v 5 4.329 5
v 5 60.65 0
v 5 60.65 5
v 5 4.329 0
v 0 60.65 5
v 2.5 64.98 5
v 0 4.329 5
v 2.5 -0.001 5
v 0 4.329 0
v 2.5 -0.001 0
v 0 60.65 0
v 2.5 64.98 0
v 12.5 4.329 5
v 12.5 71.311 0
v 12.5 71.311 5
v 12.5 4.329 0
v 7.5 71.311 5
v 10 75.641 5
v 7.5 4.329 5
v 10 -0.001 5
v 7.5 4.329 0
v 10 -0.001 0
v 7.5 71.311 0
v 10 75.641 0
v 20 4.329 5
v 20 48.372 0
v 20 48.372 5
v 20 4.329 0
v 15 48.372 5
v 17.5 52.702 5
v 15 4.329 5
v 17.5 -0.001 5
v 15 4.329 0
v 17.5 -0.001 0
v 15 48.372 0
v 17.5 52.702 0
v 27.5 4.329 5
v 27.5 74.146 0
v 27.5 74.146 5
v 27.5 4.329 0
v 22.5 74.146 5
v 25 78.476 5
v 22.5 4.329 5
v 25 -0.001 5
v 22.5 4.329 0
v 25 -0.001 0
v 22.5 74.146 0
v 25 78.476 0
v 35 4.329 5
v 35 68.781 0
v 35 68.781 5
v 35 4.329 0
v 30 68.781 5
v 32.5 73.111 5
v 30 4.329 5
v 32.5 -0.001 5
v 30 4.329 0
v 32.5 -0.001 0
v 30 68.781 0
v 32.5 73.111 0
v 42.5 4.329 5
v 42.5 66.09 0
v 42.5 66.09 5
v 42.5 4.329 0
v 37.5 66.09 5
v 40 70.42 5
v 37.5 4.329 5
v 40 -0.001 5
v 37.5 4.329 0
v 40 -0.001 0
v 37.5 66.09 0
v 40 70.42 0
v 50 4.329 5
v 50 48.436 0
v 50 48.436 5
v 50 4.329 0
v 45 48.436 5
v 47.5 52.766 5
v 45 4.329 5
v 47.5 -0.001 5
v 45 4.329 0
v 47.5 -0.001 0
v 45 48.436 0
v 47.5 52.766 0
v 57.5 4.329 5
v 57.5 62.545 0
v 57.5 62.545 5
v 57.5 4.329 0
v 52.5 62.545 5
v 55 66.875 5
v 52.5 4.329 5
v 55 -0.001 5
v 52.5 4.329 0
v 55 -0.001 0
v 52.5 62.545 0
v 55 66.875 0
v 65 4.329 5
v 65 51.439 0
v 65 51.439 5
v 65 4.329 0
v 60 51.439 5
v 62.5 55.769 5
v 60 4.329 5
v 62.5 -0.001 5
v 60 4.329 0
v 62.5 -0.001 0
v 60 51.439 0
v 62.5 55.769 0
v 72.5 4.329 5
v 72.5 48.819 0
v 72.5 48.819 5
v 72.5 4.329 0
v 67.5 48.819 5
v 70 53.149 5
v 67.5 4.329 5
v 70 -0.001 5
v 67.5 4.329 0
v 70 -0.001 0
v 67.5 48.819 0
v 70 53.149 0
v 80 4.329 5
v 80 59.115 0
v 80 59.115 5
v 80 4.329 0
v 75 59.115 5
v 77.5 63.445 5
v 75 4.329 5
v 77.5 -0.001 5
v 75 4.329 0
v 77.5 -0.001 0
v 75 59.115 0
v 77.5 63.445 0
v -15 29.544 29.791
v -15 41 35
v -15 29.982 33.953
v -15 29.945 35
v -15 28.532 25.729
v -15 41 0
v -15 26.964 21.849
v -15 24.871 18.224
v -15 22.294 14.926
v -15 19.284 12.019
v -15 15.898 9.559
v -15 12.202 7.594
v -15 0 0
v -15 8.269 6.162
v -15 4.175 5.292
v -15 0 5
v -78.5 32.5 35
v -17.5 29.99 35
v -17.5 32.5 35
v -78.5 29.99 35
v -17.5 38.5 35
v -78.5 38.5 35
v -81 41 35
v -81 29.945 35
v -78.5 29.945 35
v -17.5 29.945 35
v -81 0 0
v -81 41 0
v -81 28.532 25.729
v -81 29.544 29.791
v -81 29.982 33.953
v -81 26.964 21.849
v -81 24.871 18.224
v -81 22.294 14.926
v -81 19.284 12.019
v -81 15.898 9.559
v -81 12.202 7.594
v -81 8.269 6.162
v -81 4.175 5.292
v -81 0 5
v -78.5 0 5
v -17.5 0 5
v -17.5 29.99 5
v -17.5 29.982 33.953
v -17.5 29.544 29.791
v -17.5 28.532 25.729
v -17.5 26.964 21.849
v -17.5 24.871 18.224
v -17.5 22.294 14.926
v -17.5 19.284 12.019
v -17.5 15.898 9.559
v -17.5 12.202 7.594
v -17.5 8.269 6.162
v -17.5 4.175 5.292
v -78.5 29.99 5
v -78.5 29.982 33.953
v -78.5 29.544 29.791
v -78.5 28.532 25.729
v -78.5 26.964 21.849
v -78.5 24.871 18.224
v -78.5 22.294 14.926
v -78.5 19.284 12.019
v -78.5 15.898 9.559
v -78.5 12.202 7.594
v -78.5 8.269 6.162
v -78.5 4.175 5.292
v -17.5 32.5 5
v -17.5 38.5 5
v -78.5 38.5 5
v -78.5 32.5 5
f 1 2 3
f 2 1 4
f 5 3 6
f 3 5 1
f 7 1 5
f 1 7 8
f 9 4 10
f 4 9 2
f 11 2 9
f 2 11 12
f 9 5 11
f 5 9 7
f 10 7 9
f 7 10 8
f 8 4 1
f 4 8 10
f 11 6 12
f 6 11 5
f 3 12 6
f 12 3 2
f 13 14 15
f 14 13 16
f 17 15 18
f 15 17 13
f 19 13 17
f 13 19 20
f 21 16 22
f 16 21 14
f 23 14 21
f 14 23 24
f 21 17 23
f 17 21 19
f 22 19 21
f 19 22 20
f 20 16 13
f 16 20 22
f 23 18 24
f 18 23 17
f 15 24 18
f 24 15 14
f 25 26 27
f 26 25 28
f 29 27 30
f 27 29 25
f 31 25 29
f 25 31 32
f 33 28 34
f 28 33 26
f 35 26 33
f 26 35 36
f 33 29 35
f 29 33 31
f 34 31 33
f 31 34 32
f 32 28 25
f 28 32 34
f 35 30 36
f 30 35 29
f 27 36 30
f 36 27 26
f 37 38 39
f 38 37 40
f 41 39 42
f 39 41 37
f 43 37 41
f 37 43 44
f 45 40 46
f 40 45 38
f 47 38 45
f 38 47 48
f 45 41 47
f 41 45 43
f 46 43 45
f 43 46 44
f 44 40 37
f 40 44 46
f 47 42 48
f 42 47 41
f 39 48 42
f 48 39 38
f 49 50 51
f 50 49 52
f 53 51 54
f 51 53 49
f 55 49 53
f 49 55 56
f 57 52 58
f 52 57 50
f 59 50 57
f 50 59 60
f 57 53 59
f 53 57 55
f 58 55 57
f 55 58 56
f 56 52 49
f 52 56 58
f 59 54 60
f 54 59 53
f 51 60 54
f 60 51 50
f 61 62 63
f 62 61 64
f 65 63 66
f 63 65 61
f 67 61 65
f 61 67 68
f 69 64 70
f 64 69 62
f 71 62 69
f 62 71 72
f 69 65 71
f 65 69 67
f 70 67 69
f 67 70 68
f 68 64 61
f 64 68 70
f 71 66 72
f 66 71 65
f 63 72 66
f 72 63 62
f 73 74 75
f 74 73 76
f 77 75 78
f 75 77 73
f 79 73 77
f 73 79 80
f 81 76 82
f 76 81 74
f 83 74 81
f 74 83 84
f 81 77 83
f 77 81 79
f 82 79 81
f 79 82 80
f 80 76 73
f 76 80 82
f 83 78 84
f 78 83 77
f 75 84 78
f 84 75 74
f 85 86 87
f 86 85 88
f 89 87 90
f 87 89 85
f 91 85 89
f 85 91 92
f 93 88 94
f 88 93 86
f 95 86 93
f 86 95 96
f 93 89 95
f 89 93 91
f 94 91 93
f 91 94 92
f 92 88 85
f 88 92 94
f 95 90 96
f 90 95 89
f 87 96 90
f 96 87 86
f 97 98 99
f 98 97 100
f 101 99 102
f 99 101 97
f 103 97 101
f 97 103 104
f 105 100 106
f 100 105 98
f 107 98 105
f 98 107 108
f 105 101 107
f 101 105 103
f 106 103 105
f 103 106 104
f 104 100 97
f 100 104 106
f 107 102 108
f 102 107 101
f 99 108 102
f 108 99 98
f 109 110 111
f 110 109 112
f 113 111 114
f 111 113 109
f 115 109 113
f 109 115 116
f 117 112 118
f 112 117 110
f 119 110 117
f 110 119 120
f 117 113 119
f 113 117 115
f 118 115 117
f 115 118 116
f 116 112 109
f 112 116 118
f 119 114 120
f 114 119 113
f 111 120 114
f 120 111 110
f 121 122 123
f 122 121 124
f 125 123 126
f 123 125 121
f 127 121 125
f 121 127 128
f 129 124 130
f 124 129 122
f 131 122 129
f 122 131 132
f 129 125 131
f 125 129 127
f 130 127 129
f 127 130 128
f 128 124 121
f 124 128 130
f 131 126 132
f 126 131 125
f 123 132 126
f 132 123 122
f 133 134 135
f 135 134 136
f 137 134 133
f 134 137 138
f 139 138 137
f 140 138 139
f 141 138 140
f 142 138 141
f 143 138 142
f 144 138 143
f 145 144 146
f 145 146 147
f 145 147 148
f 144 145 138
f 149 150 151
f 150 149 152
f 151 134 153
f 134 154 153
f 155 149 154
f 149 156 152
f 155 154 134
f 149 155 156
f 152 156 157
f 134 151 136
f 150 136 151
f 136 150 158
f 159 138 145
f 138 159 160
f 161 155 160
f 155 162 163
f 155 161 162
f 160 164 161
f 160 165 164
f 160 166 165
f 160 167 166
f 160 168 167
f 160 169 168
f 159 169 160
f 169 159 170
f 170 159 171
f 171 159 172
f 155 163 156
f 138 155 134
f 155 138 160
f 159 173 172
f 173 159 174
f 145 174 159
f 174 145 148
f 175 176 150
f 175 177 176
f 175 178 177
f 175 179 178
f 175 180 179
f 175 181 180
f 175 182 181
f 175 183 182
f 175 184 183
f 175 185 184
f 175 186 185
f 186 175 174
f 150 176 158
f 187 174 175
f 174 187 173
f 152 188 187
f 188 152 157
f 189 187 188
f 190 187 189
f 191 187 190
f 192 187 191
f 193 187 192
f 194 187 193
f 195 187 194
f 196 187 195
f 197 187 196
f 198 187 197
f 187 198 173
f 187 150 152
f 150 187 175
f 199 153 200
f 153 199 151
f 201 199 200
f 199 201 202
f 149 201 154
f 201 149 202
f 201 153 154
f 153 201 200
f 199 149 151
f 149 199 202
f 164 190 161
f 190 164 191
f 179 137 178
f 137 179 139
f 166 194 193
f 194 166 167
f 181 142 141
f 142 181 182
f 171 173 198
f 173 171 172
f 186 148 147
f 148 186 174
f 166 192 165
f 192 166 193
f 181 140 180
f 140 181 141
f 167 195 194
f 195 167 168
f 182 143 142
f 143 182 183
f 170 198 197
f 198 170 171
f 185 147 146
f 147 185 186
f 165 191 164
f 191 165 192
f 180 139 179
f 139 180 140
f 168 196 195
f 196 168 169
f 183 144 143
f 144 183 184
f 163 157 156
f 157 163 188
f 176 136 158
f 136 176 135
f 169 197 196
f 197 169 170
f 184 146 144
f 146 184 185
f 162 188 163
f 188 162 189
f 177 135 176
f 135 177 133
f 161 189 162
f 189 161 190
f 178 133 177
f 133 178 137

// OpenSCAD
//Sorting Algorithm Demostrator
//For Quicksort etc.

stickWidth = 5; 
count = 11;
//changing anything anywhere will trigger a re-randomization
Random = "yes"; // [yes,no]
random = Random == "yes" ? true : false;
echo (random);
MaxLength = 40; // Only for random (above the level)
MinLength = 5; // Only for random (above the level)
// Only for non-random; make sure # of digits matches count*2. For example, "S123034" will generate one stick of length 12, one of 30 and one of 34 (mm, above the level) 'S' is to force customizer to conver the input to string. 
Seed = "S9995908580757065605550"; 
//Seed = str (lengthSeed);
standHeight = 30; 
clearance = 0.5;

if (random) {
    randLength = rands(MinLength+standHeight,MaxLength+standHeight,count);
    for (i = [1:count])
    {
        translate ([(i-1)*stickWidth*1.5,sqrt(3)*0.5*stickWidth-0.001,0])
        union(){
            cube ([stickWidth,randLength[i-1],stickWidth]);
            translate([stickWidth/2,-stickWidth/sqrt(3)/2,0])
            rotate(30)
            cylinder (r = stickWidth/sqrt(3), h = stickWidth ,$fn = 3);
            translate([stickWidth/2,randLength[i-1]+stickWidth/2/sqrt(3),0])
            rotate(-30)
            cylinder (r = stickWidth/sqrt(3), h = stickWidth ,$fn = 3);
        }
    }
}else{
     for (i = [1:count]){
         length = standHeight+ strToNbr(Seed[2*i])+10*strToNbr(Seed[2*i-1]);
         echo (length);
         
         translate ([(i-1)*stickWidth*1.5,sqrt(3)*0.5*stickWidth-0.001,0])
        union(){
            cube ([stickWidth,length,stickWidth]);
            translate([stickWidth/2,-stickWidth/sqrt(3)/2,0])
            rotate(30)
            cylinder (r = stickWidth/sqrt(3), h = stickWidth ,$fn = 3);
            translate([stickWidth/2,length+stickWidth/2/sqrt(3),0])
            rotate(-30)
            cylinder (r = stickWidth/sqrt(3), h = stickWidth ,$fn = 3);
        }
     }
    
}


function strToNbr(str, i=0, nb=0) = i == len(str) ? nb : nb+strToNbr(str, i+1, search(str[i],"0123456789")[0]*pow(10,len(str)-i-1));



translate([-count*(stickWidth+clearance)-clearance-20, 0,0 ])

difference(){
cube ([count*(stickWidth+clearance)+clearance+5,stickWidth+2*clearance+5+30,standHeight+5]);

translate([2.5, -0.01, 5])
cube ([count*(stickWidth+clearance)+clearance,30,standHeight+5]);
translate([2.5, 32.5, 5])
cube ([count*(stickWidth+clearance)+clearance,stickWidth+2*clearance,standHeight+5]);

translate([-.5,0,standHeight+5])
scale([1,1,standHeight/30])
rotate([0,90,0])
cylinder (r = 30, h = count*(stickWidth+clearance)+clearance+6, $fn = 45);
}

//String to number found from this site: https://github.com/openscad/openscad/issues/571 
